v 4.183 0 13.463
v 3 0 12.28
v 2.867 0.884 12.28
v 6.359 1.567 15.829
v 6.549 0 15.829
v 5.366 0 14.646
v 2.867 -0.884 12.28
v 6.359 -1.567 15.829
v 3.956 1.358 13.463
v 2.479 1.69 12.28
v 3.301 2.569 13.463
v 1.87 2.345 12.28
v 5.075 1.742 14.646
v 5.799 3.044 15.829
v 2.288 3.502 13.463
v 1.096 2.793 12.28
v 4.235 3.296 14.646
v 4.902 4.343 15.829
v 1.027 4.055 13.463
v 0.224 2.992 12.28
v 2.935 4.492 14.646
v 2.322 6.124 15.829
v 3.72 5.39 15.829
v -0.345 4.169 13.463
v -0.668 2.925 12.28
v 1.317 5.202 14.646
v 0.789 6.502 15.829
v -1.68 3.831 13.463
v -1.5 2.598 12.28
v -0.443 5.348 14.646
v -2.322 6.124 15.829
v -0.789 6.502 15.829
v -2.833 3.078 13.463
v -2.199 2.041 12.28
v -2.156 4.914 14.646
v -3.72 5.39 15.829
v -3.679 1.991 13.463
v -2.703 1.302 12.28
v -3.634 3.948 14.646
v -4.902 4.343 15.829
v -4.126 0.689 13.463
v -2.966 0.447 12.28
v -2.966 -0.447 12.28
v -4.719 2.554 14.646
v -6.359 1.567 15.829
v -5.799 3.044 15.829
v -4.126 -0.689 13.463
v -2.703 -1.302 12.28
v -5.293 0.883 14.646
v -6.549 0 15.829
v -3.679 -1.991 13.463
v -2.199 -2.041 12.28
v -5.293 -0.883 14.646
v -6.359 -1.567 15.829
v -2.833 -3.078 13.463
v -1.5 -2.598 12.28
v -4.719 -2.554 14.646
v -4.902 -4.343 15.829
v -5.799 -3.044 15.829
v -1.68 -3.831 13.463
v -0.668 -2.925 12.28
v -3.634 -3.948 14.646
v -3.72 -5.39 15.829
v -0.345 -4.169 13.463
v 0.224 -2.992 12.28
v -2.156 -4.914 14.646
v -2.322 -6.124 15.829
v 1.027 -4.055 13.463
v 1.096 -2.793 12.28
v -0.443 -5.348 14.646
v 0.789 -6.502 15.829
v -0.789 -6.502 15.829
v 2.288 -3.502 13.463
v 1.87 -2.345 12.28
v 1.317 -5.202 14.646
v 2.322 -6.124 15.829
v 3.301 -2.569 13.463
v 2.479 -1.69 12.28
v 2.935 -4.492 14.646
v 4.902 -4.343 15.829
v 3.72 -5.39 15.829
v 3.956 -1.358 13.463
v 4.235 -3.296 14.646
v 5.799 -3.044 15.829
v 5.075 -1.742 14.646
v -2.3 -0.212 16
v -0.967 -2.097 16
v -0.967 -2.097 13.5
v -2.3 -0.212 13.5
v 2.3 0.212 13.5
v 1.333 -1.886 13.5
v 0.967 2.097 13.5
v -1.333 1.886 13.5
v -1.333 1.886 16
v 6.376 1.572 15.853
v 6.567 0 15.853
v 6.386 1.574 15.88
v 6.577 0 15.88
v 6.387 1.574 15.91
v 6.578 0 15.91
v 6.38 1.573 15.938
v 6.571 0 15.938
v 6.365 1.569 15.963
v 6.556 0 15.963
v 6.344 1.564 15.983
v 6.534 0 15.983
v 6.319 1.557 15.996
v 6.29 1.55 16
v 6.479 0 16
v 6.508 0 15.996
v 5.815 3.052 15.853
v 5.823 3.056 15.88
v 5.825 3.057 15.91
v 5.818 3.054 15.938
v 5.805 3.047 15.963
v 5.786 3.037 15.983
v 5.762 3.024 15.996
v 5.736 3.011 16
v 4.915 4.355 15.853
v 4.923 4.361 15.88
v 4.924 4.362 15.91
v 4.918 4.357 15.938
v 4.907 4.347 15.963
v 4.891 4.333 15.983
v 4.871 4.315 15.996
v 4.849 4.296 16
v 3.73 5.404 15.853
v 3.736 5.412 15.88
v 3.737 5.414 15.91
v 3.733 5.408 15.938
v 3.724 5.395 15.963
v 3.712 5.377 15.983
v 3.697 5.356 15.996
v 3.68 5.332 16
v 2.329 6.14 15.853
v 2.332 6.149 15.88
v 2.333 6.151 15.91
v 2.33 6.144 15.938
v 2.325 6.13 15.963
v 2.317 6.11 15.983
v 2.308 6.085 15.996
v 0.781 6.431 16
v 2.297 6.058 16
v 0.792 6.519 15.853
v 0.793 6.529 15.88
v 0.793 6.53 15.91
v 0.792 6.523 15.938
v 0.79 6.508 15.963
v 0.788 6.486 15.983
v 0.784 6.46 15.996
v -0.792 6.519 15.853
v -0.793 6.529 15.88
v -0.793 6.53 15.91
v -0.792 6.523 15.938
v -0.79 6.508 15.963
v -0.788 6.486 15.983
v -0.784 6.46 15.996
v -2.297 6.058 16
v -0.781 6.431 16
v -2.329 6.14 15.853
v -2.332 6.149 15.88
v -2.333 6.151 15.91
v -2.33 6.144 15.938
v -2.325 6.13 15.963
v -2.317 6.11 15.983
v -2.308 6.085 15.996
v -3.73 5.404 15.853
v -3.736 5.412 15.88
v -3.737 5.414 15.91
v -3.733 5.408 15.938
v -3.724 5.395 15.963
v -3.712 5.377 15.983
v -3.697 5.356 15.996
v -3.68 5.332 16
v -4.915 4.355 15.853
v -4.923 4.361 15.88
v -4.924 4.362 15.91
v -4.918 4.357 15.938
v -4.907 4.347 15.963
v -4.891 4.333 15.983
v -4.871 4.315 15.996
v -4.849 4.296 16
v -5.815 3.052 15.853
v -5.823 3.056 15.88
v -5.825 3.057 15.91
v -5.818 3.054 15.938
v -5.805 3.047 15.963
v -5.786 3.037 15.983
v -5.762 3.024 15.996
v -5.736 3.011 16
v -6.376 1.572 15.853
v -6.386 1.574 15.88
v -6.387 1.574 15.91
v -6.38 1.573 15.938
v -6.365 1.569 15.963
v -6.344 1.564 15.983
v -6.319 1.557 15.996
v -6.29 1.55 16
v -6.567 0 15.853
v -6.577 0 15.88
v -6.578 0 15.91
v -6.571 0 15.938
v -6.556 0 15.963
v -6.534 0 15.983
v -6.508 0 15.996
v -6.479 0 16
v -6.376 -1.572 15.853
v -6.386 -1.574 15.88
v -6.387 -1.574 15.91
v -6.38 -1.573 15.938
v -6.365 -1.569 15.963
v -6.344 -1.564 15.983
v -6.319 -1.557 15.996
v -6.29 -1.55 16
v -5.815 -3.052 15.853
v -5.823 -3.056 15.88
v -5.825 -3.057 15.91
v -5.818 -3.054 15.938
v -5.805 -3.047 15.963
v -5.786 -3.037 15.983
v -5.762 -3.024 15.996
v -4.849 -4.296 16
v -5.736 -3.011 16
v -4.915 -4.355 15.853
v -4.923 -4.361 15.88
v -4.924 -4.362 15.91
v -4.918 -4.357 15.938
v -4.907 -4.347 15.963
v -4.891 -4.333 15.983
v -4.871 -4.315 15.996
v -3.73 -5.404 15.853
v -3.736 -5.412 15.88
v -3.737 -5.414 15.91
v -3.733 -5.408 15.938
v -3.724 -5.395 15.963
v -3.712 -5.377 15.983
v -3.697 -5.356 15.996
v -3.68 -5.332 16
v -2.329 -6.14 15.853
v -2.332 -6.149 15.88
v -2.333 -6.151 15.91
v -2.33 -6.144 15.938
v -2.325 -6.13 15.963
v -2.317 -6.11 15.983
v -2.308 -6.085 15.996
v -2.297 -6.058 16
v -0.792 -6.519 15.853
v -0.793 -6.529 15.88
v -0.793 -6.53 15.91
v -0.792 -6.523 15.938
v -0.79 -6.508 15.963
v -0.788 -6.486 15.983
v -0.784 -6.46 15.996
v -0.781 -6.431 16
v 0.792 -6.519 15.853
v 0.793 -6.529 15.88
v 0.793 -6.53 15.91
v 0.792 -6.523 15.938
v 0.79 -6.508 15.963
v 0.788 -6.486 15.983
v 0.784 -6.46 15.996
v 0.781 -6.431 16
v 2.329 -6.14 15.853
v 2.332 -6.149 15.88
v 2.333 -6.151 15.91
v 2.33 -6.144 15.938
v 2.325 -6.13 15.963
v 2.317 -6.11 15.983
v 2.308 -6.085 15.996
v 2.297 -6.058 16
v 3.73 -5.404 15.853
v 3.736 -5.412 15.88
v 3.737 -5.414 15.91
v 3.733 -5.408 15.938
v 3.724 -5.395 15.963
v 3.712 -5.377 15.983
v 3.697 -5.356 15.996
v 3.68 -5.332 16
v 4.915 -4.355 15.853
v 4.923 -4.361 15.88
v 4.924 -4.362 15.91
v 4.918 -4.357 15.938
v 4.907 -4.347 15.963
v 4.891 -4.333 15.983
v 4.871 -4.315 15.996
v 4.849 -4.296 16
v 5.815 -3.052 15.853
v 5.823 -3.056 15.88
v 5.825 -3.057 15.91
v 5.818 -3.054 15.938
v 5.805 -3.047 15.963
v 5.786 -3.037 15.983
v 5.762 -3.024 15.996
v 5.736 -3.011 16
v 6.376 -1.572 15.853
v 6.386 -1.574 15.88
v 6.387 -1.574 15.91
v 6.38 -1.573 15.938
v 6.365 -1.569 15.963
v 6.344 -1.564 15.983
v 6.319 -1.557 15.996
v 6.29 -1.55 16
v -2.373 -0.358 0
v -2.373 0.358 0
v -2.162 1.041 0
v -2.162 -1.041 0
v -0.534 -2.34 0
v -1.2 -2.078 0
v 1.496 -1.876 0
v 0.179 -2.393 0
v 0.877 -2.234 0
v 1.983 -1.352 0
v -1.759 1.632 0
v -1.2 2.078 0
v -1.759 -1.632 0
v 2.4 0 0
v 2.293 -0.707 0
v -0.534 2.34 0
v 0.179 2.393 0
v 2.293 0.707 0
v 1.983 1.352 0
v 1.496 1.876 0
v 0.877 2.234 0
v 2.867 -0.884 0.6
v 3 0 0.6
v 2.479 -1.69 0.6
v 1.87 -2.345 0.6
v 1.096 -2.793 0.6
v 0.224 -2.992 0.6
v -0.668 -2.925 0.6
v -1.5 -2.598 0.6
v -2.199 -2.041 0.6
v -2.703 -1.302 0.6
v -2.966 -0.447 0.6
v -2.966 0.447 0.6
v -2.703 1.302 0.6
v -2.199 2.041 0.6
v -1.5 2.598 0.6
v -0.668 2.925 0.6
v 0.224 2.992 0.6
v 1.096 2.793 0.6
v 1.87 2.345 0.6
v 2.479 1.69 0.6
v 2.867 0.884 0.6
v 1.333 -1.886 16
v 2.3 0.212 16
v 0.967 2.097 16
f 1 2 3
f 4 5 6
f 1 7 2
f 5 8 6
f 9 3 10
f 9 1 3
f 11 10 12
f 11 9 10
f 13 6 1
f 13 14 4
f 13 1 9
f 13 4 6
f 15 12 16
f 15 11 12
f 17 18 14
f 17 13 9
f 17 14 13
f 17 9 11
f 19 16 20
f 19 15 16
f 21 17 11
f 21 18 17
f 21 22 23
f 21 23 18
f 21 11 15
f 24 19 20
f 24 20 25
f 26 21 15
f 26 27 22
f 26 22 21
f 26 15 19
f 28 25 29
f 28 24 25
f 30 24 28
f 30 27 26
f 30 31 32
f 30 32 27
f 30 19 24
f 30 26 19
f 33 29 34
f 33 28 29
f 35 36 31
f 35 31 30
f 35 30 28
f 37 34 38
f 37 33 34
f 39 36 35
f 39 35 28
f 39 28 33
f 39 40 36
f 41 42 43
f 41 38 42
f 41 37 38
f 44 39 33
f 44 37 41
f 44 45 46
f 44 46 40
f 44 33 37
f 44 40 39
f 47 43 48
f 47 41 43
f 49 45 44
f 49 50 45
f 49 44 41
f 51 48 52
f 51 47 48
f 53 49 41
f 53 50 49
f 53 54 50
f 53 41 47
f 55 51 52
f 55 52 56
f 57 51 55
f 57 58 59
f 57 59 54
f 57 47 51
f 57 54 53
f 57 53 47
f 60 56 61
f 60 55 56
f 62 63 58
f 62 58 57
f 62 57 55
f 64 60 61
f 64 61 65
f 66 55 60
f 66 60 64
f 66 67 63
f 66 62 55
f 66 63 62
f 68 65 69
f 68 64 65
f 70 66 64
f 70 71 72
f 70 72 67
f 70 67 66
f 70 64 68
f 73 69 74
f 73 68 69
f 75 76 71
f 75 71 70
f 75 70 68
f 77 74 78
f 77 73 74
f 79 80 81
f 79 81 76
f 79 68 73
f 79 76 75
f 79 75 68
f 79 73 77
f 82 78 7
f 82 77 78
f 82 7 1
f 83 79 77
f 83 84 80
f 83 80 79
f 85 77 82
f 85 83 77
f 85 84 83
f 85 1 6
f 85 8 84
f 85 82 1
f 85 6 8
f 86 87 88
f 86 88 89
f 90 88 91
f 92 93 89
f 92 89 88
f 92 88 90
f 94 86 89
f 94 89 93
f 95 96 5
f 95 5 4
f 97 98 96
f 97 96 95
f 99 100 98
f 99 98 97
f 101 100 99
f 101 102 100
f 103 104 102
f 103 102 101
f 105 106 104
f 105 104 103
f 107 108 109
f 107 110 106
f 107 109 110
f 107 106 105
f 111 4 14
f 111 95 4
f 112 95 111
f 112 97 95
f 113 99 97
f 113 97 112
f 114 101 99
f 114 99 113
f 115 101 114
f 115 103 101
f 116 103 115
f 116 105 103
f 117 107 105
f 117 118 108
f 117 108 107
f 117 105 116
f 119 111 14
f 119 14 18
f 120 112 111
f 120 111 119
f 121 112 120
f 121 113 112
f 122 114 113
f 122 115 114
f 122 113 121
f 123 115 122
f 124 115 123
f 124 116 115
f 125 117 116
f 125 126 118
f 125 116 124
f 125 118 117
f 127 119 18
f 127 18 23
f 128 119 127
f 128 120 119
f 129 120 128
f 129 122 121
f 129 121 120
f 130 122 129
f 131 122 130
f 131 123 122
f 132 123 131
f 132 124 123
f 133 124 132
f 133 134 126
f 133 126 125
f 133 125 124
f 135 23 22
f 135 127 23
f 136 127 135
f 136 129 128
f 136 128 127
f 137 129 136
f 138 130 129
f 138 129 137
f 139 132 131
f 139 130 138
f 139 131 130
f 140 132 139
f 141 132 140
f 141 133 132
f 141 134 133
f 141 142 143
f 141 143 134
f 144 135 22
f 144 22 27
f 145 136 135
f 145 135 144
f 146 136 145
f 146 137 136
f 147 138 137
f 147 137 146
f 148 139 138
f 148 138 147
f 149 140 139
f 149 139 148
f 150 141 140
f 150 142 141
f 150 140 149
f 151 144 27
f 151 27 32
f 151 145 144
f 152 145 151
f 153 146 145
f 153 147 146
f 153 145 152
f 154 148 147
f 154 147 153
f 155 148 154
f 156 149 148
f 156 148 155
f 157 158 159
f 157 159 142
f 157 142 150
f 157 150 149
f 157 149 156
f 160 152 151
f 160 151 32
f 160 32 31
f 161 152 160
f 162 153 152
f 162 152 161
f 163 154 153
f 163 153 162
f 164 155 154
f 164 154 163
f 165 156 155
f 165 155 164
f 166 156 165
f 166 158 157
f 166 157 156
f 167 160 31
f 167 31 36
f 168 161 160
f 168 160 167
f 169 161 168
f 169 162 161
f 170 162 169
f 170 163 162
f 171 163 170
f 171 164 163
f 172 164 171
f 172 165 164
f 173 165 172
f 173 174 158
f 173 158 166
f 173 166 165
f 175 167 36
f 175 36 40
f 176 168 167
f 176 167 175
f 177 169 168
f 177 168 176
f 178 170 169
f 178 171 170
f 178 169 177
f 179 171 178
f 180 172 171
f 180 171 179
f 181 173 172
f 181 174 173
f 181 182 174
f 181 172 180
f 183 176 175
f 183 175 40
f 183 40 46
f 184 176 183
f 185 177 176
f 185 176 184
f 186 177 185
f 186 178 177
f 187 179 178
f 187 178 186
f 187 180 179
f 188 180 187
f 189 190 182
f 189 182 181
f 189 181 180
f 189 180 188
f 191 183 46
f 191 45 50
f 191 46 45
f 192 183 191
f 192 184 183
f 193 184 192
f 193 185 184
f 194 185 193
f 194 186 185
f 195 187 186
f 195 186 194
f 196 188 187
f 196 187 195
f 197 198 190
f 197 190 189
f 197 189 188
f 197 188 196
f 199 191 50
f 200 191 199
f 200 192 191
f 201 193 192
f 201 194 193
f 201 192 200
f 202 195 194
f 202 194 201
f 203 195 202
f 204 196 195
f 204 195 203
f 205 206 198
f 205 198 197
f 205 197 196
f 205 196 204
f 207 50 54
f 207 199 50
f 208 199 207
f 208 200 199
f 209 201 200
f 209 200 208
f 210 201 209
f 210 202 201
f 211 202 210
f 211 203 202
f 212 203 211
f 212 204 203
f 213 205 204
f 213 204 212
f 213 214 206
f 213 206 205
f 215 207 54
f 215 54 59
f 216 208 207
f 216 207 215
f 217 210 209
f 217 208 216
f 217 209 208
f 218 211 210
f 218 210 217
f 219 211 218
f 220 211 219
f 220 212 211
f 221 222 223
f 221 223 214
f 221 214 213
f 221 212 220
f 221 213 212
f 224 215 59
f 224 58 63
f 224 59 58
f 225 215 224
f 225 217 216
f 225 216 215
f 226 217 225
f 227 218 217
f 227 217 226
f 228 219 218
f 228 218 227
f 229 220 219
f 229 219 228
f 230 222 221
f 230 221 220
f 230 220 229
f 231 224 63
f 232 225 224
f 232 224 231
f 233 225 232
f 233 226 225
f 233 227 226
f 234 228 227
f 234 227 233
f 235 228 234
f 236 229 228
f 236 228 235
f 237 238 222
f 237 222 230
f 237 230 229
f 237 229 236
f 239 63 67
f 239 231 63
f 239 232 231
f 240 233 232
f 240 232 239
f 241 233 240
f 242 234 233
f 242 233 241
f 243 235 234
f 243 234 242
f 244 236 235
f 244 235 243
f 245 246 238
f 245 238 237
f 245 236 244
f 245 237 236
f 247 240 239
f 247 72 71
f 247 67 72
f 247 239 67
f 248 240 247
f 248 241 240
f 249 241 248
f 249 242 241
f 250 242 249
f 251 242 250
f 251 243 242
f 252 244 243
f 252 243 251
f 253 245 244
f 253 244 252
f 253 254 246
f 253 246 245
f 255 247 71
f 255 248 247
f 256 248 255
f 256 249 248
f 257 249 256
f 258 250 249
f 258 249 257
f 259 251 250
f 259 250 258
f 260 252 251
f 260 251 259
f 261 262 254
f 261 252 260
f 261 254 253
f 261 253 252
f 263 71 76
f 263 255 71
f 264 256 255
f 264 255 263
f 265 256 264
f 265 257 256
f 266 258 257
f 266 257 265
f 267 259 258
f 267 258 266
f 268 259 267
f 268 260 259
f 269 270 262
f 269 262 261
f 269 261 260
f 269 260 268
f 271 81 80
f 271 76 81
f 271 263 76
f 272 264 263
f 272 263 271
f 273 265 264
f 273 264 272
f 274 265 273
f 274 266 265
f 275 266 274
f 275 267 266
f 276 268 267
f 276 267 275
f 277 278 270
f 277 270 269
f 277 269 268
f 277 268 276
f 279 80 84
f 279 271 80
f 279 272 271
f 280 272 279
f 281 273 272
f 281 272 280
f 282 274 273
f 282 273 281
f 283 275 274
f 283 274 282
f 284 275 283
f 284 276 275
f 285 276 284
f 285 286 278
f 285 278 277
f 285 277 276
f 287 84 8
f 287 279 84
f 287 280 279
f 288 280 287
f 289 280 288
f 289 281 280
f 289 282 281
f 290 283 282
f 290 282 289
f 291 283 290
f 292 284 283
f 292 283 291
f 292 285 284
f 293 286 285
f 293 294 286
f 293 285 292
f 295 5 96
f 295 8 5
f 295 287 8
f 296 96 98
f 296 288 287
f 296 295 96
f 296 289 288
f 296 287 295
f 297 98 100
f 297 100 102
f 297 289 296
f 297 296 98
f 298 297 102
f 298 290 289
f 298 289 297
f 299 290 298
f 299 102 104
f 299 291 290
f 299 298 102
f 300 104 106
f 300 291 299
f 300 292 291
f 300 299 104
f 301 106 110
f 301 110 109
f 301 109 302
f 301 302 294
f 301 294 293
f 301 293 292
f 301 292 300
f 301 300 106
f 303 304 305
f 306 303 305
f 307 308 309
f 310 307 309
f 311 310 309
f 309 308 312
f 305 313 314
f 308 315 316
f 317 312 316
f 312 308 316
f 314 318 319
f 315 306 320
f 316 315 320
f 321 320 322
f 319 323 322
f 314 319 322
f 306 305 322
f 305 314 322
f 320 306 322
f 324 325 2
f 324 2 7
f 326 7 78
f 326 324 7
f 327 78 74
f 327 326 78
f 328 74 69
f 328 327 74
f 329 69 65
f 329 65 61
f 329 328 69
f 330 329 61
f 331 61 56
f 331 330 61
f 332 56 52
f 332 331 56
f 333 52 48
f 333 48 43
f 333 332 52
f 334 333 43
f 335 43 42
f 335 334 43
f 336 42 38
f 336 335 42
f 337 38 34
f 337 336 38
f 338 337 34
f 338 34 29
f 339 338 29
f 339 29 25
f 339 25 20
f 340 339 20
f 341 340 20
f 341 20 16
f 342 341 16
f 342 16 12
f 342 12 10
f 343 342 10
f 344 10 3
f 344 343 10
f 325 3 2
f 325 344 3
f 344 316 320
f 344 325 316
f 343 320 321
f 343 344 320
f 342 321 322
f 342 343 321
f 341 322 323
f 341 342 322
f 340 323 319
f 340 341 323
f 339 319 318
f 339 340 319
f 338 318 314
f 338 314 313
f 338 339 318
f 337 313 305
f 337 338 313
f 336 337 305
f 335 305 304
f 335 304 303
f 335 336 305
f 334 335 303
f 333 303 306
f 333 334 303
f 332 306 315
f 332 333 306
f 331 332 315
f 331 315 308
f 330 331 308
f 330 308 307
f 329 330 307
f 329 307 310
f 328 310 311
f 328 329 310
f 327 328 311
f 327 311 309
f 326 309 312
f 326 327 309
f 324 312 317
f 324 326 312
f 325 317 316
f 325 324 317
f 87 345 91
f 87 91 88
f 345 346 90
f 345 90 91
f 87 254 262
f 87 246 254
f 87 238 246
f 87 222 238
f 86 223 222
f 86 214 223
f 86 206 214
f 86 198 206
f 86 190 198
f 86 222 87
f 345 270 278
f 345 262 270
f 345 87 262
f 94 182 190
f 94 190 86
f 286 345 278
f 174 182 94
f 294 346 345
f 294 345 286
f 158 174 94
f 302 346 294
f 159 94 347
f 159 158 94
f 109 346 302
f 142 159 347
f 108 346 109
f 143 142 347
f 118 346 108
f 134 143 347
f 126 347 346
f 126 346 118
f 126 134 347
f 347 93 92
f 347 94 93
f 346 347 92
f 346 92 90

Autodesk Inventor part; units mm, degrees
ref_plane "YZ Plane" through (0, 0, 0) normal (1, 0, 0) x (0, 1, 0)
ref_plane "XZ Plane" through (0, 0, 0) normal (0, 1, 0) x (-1, 0, 0)
ref_plane "XY Plane" through (0, 0, 0) normal (0, 0, 1) x (1, 0, 0)
sketch "Sketch1" plane through (0, 0, 0) normal (0, 0, 1) x (1, 0, 0)
  circle A0 centre (0, 0) radius 3
  dimension "Diameter" = 6
extrude "Extrusion1" add sketch "Sketch1" along normal blind 12.28
sketch "Sketch2" plane through (0, 0, 12.28) normal (0, 0, 1) x (1, 0, 0)
  circle A0 centre (0, 0) radius 3 projected
extrude "Extrusion2" add sketch "Sketch2" along normal blind 3.72 draft 45
sketch "Sketch3" plane through (0, 0, 16) normal (0, 0, 1) x (1, 0, 0)
  circle A0 centre (0, 0) radius 6.72 projected
  circle A1 centre (0, 0) radius 2.3094 construction
  line L0 (0.9667, 2.0973) -> (2.2997, 0.2115)
  line L1 (2.2997, 0.2115) -> (1.333, -1.8859)
  line L2 (1.333, -1.8859) -> (-0.9667, -2.0973)
  line L3 (-0.9667, -2.0973) -> (-2.2997, -0.2115)
  line L4 (-2.2997, -0.2115) -> (-1.333, 1.8859)
  line L5 (-1.333, 1.8859) -> (0.9667, 2.0973)
  dimension "Hex_Width" = 4
extrude "Extrusion3" cut sketch "Sketch3" against normal blind 2.5 contours L0 L1 L2 L3 L4 L5
thread "Thread1" size "M6x1" class "4g6g" standard "ANSI Metric M Profile" length 12.28
chamfer "Chamfer2" distance 0.6 angle 45 1 edges at (-3, 0, 0)
fillet "Fillet1" radius 0.1 1 edges at (-6.72, 0, 16)
equation "\"d10\" = Thread_Length"
equation "\"d13\" = Chamfer"
equation "\"Thread_Length\" = 12.28"
equation "\"Length\" = 16"
equation "\"Chamfer\" = 0.6"
properties part number "SCREW,FLAT HD,P,12.9,M6X1.00X16MM"
